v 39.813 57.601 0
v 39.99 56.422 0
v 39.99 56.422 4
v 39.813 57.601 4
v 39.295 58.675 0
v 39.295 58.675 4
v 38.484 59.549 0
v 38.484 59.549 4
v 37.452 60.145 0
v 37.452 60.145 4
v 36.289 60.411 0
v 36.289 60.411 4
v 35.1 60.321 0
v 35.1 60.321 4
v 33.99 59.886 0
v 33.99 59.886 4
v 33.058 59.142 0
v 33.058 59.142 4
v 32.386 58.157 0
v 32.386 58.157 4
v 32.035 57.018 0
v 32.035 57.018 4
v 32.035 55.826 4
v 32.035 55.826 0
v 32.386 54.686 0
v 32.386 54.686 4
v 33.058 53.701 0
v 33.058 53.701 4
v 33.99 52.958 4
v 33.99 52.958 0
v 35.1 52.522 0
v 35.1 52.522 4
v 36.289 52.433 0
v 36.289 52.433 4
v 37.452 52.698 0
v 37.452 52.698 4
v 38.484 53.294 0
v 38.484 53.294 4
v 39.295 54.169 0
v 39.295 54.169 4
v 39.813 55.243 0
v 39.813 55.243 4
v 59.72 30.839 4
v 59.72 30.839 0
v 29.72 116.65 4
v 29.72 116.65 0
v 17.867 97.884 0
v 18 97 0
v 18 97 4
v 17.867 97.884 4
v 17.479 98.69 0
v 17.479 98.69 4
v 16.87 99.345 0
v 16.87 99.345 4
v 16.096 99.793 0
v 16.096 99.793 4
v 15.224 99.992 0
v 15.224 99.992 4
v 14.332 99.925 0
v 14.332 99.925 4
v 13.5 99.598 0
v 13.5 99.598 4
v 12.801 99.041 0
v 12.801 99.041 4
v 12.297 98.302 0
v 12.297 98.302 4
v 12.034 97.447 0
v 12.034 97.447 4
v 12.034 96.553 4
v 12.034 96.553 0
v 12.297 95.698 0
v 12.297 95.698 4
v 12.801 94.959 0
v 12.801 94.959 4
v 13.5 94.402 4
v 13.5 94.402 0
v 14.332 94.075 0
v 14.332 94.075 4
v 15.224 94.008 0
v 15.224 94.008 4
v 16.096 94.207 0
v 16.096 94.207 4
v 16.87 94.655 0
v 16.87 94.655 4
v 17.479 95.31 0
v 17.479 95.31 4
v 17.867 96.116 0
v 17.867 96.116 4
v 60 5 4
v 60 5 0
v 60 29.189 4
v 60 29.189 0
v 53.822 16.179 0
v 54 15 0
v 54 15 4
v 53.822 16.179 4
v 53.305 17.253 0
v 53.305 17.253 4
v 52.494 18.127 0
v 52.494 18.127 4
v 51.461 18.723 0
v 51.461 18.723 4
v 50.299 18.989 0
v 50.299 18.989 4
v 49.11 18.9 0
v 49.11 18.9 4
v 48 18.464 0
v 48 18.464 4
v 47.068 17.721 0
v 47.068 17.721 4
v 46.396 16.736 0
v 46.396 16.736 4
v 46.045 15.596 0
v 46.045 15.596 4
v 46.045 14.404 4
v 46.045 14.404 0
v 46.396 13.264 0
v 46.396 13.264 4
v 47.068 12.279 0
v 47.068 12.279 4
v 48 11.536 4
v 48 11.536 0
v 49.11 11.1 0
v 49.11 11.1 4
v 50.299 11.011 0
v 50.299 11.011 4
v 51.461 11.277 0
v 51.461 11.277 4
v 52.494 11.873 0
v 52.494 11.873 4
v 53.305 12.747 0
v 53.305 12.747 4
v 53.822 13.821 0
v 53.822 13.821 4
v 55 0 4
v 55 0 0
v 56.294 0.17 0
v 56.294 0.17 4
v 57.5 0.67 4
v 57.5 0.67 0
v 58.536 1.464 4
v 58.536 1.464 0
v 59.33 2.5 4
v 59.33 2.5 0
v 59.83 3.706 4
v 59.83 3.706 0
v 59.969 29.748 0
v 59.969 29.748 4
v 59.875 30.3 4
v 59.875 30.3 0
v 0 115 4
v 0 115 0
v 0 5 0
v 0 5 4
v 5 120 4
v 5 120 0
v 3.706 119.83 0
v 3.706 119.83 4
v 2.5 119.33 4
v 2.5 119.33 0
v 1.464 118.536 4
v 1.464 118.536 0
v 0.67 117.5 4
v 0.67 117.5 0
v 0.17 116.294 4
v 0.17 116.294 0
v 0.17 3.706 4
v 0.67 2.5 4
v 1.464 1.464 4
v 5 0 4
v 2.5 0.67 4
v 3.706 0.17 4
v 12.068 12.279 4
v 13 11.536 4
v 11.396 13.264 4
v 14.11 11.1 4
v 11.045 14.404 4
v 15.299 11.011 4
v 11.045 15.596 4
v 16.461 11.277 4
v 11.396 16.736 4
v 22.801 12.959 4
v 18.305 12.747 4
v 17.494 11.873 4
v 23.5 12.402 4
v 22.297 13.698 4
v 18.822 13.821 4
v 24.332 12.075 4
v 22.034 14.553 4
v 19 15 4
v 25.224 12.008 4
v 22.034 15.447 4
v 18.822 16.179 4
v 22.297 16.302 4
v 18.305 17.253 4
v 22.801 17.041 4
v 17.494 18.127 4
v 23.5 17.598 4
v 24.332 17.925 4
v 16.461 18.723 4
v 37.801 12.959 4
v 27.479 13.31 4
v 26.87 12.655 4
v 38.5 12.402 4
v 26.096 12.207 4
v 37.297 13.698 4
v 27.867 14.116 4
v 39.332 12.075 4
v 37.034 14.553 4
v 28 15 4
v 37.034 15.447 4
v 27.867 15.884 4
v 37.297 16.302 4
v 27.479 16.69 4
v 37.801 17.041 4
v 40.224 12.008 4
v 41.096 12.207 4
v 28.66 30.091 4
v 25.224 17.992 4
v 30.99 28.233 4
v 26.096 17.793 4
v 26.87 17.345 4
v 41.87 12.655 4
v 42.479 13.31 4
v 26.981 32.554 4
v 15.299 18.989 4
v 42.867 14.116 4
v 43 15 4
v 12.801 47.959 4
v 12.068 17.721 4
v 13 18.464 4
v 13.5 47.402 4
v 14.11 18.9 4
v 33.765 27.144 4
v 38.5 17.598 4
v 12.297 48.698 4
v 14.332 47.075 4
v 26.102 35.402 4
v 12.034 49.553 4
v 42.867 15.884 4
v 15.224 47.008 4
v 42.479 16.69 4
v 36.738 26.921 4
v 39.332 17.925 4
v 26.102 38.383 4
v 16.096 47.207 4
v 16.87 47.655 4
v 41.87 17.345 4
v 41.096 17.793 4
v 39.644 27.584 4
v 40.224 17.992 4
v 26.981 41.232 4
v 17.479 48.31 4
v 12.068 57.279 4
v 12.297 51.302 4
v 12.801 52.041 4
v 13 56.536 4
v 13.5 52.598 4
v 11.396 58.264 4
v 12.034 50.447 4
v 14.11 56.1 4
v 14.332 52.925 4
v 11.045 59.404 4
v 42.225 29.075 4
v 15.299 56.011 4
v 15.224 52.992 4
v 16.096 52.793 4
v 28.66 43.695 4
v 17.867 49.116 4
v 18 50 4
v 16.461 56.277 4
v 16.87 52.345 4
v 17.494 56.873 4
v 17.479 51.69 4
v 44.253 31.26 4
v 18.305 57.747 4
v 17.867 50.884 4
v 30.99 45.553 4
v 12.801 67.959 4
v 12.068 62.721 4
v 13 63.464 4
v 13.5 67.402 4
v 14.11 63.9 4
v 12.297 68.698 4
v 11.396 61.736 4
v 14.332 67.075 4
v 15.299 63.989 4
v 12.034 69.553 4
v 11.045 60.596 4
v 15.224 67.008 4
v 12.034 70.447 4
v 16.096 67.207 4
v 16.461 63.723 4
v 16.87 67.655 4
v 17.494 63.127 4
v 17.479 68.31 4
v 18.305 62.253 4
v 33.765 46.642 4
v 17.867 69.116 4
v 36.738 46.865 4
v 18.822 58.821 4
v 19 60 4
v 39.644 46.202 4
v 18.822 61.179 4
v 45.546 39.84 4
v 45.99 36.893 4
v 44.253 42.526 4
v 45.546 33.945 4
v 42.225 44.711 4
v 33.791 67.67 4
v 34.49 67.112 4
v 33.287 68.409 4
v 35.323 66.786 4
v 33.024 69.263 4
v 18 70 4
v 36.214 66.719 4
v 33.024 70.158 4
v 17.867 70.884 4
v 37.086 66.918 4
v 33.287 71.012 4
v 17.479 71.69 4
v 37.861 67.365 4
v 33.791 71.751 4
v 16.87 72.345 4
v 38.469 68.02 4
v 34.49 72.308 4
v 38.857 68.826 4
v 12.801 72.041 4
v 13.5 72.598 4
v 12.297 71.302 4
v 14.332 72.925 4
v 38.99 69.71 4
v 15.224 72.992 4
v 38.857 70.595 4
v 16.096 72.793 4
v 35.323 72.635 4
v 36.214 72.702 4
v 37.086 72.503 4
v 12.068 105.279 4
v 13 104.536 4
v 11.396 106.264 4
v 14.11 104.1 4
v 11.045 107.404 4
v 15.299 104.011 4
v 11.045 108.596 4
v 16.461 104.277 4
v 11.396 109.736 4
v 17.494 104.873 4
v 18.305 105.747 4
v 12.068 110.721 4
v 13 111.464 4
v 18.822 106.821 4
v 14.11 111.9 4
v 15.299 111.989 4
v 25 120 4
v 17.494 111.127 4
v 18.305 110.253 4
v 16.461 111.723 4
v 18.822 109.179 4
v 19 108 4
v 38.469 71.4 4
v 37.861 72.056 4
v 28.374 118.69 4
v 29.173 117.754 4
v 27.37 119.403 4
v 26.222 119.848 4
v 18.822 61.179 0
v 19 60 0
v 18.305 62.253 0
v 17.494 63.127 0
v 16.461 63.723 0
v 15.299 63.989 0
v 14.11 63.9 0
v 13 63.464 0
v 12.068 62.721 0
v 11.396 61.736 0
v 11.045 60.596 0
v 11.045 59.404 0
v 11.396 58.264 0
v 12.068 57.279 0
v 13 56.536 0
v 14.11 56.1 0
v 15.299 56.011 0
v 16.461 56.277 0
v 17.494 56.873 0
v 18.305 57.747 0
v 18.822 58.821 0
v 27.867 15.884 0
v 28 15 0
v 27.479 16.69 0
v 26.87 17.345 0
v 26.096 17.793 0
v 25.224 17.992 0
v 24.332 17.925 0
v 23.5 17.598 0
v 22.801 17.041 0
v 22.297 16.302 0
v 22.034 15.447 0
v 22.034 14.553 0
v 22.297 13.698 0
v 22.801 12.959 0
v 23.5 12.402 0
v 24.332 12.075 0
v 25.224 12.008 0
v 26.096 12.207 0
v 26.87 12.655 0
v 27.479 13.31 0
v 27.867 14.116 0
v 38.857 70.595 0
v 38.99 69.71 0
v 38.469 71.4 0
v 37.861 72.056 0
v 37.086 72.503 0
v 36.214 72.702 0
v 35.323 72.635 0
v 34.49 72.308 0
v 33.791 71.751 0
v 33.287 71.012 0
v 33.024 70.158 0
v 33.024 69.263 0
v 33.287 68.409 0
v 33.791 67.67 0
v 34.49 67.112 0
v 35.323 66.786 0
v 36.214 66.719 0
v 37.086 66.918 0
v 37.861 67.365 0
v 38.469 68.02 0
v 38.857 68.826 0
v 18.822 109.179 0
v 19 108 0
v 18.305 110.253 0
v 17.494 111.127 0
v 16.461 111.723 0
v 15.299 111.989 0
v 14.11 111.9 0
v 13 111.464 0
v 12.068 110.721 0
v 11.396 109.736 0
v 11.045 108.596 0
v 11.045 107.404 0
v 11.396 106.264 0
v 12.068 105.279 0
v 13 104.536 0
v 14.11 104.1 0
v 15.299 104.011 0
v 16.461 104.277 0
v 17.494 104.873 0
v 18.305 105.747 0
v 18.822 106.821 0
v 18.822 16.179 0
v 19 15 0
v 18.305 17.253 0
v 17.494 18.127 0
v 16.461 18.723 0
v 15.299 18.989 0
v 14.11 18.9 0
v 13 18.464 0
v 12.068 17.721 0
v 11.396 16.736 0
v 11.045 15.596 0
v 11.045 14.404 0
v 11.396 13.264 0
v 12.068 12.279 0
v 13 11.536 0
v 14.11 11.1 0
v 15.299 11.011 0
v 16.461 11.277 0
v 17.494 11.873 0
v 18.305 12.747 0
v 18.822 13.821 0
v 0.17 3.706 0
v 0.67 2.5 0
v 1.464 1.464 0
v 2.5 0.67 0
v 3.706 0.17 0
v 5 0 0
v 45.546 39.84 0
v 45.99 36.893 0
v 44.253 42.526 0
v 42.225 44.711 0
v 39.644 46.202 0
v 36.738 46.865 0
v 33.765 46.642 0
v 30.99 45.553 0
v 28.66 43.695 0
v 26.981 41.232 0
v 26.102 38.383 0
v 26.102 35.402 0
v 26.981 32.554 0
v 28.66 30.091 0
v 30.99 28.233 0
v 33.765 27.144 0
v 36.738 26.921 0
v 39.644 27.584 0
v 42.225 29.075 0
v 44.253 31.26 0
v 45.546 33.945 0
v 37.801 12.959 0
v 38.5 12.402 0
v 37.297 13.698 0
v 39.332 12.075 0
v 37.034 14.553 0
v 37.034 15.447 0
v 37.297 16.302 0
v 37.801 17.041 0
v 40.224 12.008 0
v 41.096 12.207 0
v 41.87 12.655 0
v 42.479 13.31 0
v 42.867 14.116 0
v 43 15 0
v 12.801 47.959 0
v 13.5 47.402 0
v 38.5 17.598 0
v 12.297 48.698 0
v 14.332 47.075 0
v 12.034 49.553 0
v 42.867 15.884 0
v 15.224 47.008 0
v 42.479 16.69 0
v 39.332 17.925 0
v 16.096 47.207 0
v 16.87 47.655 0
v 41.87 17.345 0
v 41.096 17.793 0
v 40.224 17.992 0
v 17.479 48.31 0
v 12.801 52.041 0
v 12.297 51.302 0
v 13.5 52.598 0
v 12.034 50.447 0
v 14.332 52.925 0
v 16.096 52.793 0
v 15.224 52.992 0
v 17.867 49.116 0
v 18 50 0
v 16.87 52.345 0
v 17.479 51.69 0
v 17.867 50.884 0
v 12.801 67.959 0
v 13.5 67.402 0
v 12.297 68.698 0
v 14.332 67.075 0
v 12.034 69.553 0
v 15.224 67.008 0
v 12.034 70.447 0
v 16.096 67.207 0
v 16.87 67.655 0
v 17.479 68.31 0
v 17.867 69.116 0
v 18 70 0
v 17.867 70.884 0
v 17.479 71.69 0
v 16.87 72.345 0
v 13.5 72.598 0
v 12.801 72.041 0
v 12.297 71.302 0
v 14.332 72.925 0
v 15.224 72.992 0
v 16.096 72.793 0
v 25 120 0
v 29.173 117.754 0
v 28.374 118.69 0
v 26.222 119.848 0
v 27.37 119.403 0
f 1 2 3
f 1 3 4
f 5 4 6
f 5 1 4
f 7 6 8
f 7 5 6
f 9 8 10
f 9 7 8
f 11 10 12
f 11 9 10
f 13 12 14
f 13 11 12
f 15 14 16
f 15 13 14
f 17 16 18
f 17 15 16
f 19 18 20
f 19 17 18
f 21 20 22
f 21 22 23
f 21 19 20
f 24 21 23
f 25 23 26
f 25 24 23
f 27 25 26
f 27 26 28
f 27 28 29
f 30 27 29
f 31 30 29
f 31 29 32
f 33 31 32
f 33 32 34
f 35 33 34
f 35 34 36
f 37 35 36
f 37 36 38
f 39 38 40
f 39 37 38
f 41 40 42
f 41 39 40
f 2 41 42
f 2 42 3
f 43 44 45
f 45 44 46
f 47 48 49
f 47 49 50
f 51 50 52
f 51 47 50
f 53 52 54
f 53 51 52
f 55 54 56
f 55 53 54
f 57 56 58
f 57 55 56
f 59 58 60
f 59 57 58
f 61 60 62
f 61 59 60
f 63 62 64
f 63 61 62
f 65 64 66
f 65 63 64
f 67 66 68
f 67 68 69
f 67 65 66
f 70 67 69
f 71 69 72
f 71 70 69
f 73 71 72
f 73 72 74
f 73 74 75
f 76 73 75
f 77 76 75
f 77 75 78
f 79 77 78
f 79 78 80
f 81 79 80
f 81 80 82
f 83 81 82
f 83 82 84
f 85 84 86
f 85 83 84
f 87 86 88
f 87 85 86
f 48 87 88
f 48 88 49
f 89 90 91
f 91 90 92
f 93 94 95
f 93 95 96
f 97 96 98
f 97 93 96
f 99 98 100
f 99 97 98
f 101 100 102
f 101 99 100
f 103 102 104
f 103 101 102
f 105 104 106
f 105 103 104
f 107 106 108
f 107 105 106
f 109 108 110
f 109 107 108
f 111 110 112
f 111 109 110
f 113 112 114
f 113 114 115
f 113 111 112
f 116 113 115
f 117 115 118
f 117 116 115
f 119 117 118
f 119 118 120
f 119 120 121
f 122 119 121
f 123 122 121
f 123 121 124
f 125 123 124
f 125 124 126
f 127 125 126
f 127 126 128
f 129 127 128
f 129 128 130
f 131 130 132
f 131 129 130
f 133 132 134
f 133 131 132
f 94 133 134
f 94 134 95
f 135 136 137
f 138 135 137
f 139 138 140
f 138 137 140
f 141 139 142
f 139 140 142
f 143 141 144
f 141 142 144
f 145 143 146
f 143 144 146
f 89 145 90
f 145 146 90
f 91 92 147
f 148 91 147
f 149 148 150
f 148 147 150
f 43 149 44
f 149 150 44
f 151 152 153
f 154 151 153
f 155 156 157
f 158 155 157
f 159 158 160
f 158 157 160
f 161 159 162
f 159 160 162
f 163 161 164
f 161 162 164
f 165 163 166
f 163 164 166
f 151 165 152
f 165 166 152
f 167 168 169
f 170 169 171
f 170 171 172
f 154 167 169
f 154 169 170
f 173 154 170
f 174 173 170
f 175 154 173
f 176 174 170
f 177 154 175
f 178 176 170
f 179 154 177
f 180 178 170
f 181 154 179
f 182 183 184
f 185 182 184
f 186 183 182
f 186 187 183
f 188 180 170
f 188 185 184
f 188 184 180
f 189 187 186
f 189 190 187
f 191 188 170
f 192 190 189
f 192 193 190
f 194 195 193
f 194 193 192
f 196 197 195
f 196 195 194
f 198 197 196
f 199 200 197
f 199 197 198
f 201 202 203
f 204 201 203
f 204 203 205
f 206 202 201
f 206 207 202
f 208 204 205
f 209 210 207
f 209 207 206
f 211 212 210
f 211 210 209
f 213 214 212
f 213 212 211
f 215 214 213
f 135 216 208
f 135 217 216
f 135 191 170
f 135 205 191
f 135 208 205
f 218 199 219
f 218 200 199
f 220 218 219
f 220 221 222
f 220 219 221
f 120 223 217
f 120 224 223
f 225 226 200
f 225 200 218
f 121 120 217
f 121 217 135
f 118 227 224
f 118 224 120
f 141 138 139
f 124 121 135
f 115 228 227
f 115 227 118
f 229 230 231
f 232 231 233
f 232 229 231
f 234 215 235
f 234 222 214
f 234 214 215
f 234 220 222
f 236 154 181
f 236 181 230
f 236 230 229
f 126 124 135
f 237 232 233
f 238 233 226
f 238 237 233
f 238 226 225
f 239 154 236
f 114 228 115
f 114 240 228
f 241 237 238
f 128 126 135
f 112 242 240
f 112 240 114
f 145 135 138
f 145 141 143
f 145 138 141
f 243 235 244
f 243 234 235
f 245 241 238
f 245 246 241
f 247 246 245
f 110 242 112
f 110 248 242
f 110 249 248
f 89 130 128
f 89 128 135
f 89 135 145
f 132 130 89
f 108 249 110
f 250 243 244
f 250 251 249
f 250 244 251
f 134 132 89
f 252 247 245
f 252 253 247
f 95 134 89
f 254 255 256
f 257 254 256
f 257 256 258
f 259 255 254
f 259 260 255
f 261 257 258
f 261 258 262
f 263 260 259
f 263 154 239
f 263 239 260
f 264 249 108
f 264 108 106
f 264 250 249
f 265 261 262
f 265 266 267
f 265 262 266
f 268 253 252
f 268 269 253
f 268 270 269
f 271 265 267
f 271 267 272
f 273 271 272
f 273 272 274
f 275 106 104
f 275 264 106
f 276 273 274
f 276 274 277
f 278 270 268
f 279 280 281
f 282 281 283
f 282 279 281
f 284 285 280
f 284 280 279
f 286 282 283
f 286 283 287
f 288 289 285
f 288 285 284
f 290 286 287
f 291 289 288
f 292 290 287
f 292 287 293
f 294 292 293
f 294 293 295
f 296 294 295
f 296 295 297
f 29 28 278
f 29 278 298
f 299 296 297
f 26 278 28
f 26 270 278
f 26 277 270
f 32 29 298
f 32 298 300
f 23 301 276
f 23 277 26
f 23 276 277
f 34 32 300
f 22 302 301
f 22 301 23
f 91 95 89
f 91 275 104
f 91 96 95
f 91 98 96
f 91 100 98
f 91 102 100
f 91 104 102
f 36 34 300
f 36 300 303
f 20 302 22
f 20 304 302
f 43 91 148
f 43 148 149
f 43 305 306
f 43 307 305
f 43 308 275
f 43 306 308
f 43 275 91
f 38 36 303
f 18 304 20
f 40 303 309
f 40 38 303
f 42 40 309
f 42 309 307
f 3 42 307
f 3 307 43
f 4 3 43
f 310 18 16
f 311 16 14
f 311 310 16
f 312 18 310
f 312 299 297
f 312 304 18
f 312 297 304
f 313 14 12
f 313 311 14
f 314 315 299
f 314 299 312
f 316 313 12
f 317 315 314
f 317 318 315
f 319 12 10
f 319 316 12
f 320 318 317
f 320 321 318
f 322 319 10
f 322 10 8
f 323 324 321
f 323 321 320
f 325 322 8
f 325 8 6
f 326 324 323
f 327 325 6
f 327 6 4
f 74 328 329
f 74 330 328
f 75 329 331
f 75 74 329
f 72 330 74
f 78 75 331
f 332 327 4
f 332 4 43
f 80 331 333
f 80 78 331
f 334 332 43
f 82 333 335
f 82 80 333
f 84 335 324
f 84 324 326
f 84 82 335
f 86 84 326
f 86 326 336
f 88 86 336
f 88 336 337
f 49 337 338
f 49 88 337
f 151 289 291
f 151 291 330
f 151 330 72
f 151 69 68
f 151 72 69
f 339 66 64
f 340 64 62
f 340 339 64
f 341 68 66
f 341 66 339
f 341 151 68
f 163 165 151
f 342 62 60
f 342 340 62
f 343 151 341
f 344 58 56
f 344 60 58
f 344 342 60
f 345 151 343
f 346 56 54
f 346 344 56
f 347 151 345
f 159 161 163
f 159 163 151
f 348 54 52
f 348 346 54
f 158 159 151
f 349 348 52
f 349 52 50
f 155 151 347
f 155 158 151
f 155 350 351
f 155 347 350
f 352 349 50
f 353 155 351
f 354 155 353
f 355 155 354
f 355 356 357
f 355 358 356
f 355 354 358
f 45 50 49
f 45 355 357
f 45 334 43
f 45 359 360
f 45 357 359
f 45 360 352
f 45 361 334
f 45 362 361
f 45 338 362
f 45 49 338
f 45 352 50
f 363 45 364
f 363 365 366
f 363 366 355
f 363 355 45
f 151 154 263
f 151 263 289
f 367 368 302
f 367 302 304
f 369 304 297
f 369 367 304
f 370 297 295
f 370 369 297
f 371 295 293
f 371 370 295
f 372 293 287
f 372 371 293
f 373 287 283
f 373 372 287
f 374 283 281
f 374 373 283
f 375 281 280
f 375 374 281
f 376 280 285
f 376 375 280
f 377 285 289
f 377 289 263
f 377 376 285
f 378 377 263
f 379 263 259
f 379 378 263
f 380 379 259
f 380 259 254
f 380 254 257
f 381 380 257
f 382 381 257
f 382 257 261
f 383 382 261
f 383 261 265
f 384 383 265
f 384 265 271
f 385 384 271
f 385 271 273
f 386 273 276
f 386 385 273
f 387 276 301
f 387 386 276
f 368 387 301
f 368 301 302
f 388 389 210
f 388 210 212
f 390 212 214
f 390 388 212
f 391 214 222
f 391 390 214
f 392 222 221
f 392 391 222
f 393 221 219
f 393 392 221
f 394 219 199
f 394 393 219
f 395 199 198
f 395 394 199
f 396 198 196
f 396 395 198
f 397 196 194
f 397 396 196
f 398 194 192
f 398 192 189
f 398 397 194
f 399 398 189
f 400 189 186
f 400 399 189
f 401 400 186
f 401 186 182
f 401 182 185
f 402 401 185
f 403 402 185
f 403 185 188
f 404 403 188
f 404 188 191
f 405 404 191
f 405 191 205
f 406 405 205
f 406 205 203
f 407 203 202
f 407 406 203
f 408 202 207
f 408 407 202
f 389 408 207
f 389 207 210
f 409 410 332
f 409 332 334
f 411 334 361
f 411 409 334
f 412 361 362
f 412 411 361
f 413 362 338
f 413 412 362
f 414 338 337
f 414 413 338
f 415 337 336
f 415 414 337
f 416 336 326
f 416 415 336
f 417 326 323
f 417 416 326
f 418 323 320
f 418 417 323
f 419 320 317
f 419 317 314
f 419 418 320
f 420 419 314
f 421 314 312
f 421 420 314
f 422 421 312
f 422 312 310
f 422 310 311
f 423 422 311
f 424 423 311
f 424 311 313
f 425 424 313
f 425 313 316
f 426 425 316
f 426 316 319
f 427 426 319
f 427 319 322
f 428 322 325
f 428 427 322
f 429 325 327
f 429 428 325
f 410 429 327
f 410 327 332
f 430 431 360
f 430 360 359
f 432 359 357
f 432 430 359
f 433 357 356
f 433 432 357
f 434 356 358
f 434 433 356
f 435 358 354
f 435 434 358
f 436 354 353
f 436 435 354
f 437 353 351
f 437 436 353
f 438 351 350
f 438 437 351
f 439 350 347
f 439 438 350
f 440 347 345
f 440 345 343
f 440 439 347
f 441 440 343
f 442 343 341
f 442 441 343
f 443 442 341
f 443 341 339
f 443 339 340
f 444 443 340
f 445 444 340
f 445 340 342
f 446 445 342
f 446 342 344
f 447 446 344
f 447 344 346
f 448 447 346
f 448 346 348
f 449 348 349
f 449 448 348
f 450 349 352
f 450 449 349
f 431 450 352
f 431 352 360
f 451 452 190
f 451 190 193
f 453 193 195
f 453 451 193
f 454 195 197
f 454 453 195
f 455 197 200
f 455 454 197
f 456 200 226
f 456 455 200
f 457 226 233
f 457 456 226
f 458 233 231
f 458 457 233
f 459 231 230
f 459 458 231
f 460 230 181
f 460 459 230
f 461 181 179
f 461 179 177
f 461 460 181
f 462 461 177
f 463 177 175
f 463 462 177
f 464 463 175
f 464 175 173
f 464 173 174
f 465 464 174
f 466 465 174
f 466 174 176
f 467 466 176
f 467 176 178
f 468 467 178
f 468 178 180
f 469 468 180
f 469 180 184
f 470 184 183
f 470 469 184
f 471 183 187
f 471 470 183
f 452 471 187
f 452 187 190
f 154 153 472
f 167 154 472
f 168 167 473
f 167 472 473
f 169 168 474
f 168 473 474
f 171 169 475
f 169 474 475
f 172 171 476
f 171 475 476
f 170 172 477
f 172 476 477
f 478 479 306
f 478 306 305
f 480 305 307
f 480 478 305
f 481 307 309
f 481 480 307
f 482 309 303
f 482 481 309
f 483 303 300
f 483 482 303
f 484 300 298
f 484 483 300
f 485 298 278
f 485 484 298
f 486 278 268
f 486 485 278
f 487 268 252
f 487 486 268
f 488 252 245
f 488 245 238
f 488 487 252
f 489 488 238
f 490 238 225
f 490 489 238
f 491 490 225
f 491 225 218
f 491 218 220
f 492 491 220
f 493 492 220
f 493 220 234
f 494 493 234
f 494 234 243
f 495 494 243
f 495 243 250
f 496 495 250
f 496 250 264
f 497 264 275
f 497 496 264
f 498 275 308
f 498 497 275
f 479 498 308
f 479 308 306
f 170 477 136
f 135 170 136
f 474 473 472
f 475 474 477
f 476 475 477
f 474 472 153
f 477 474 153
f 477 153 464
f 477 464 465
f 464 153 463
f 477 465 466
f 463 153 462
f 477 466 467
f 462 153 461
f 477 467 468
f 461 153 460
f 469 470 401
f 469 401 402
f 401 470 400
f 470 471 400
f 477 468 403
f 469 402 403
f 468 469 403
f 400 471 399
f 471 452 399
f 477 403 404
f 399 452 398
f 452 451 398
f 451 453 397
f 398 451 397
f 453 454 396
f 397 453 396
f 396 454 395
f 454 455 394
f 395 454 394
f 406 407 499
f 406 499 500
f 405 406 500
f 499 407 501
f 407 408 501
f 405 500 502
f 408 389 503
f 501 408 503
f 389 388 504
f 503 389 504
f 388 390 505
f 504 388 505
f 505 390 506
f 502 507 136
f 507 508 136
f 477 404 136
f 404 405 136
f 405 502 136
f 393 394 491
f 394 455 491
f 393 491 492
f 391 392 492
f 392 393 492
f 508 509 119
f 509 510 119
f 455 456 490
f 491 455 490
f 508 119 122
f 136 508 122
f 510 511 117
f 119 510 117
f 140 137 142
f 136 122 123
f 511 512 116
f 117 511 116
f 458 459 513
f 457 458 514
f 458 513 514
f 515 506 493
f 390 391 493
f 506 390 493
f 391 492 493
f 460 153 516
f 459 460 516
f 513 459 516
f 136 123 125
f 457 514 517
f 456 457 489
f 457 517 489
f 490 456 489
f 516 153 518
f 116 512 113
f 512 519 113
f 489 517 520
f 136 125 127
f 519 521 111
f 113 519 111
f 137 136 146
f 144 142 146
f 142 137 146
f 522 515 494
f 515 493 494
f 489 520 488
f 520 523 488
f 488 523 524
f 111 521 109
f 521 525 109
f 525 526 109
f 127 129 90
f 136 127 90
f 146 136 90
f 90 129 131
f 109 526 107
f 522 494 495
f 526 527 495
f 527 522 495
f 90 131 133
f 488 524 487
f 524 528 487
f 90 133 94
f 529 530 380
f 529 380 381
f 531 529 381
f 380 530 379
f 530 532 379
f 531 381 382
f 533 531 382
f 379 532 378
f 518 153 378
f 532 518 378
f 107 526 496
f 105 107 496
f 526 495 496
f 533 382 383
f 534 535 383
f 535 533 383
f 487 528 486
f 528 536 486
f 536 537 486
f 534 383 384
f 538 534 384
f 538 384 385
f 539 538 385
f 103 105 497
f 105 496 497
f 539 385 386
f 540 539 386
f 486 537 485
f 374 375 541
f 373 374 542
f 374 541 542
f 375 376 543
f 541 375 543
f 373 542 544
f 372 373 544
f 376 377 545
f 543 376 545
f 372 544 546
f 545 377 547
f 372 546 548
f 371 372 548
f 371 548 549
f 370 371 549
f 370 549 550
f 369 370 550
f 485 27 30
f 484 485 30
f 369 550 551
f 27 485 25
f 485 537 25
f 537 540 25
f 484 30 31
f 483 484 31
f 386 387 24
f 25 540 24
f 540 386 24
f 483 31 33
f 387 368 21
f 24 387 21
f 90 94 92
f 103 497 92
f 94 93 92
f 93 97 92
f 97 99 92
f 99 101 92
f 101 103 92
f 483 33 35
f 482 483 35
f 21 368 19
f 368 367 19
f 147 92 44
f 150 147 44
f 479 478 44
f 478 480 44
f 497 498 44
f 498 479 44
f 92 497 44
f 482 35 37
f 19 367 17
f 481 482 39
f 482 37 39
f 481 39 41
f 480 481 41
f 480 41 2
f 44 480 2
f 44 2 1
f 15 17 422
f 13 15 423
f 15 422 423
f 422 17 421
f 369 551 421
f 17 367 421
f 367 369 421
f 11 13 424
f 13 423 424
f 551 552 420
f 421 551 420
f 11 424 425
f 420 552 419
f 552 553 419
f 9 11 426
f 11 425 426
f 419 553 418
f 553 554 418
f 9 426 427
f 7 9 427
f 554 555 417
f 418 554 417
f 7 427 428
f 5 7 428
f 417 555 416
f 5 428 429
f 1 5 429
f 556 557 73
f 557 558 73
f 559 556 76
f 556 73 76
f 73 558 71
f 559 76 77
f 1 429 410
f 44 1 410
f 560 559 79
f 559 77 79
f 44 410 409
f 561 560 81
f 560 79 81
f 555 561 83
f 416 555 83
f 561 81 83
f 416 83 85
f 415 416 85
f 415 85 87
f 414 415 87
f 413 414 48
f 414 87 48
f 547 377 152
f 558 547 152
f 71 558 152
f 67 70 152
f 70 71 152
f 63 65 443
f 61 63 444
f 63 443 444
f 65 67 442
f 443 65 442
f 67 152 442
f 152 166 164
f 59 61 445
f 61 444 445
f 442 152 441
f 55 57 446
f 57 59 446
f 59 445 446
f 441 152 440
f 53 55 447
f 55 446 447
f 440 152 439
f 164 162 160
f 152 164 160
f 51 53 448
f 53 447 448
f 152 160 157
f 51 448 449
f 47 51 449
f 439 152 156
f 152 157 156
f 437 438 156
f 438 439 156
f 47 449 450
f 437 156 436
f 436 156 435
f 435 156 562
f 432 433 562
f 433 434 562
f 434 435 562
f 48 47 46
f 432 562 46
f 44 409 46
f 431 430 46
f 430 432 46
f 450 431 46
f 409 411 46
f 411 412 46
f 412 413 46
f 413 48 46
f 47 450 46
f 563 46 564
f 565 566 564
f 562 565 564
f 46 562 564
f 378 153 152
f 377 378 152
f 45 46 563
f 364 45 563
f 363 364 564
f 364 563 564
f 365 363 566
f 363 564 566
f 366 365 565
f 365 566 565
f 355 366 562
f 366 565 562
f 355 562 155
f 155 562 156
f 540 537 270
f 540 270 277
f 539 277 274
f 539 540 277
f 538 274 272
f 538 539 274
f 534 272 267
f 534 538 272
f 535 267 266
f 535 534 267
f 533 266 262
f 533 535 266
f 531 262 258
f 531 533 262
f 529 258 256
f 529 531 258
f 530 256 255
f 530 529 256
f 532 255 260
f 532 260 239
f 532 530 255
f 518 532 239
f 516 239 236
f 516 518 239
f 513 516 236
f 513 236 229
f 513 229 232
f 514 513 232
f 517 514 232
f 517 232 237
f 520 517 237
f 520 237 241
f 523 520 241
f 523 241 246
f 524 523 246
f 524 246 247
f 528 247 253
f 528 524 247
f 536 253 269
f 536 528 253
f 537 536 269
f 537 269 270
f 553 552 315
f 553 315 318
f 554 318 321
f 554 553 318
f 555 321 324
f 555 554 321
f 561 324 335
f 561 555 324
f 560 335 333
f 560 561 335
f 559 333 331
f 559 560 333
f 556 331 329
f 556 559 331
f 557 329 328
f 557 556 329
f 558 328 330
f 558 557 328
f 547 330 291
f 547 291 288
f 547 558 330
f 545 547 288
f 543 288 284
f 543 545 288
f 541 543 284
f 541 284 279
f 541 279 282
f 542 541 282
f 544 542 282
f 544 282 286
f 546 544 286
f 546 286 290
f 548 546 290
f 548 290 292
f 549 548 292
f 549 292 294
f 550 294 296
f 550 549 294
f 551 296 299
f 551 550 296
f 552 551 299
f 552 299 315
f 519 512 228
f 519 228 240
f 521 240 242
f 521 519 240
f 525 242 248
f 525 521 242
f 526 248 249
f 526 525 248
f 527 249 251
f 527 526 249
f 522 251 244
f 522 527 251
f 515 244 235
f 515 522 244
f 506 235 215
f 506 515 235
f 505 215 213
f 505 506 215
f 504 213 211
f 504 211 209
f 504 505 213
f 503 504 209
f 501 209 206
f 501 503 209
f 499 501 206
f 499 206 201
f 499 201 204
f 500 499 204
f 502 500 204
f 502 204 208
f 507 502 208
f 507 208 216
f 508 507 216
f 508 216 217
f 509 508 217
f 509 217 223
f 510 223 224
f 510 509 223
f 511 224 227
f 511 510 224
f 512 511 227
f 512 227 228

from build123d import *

# Parameters (mm, degrees)
F0_R     = 4
F0_R_2   = 3
F0_R_3   = 10
F1_DEPTH = 4


with BuildPart() as f1:
    # F0 (on Top) → F1 (new body)
    with BuildSketch(Plane.XY):
        with BuildLine():
            ThreePointArc((0, 5), (1.464466, 1.464466), (5, 0))
            Line((5, 0), (55, 0))
            ThreePointArc((55, 0), (58.535534, 1.464466), (60, 5))
            Line((60, 5), (60, 29.188612))
            ThreePointArc((60, 29.188612), (59.929471, 30.025459), (59.719874, 30.838698))
            Line((59.719874, 30.838698), (29.719874, 116.650087))
            ThreePointArc((29.719874, 116.650087), (27.893922, 119.077403), (25, 120))
            Line((25, 120), (5, 120))
            ThreePointArc((5, 120), (1.464466, 118.535534), (0, 115))
            Line((0, 115), (0, 5))
        make_face()
        with Locations((15, 15)):
            Circle(F0_R, mode=Mode.SUBTRACT)
        with Locations((25, 15)):
            Circle(F0_R_2, mode=Mode.SUBTRACT)
        with Locations((15, 50)):
            Circle(F0_R_2, mode=Mode.SUBTRACT)
        with Locations((40, 15)):
            Circle(F0_R_2, mode=Mode.SUBTRACT)
        with Locations((50, 15)):
            Circle(F0_R, mode=Mode.SUBTRACT)
        with Locations((35.990281, 36.892906)):
            Circle(F0_R_3, mode=Mode.SUBTRACT)
        with Locations((35.990281, 56.421787)):
            Circle(F0_R, mode=Mode.SUBTRACT)
        with Locations((15, 60)):
            Circle(F0_R, mode=Mode.SUBTRACT)
        with Locations((15, 70)):
            Circle(F0_R_2, mode=Mode.SUBTRACT)
        with Locations((15, 97)):
            Circle(F0_R_2, mode=Mode.SUBTRACT)
        with Locations((15, 108)):
            Circle(F0_R, mode=Mode.SUBTRACT)
        with Locations((35.990281, 69.710411)):
            Circle(F0_R_2, mode=Mode.SUBTRACT)
    extrude(amount=F1_DEPTH)


solid = f1.part
